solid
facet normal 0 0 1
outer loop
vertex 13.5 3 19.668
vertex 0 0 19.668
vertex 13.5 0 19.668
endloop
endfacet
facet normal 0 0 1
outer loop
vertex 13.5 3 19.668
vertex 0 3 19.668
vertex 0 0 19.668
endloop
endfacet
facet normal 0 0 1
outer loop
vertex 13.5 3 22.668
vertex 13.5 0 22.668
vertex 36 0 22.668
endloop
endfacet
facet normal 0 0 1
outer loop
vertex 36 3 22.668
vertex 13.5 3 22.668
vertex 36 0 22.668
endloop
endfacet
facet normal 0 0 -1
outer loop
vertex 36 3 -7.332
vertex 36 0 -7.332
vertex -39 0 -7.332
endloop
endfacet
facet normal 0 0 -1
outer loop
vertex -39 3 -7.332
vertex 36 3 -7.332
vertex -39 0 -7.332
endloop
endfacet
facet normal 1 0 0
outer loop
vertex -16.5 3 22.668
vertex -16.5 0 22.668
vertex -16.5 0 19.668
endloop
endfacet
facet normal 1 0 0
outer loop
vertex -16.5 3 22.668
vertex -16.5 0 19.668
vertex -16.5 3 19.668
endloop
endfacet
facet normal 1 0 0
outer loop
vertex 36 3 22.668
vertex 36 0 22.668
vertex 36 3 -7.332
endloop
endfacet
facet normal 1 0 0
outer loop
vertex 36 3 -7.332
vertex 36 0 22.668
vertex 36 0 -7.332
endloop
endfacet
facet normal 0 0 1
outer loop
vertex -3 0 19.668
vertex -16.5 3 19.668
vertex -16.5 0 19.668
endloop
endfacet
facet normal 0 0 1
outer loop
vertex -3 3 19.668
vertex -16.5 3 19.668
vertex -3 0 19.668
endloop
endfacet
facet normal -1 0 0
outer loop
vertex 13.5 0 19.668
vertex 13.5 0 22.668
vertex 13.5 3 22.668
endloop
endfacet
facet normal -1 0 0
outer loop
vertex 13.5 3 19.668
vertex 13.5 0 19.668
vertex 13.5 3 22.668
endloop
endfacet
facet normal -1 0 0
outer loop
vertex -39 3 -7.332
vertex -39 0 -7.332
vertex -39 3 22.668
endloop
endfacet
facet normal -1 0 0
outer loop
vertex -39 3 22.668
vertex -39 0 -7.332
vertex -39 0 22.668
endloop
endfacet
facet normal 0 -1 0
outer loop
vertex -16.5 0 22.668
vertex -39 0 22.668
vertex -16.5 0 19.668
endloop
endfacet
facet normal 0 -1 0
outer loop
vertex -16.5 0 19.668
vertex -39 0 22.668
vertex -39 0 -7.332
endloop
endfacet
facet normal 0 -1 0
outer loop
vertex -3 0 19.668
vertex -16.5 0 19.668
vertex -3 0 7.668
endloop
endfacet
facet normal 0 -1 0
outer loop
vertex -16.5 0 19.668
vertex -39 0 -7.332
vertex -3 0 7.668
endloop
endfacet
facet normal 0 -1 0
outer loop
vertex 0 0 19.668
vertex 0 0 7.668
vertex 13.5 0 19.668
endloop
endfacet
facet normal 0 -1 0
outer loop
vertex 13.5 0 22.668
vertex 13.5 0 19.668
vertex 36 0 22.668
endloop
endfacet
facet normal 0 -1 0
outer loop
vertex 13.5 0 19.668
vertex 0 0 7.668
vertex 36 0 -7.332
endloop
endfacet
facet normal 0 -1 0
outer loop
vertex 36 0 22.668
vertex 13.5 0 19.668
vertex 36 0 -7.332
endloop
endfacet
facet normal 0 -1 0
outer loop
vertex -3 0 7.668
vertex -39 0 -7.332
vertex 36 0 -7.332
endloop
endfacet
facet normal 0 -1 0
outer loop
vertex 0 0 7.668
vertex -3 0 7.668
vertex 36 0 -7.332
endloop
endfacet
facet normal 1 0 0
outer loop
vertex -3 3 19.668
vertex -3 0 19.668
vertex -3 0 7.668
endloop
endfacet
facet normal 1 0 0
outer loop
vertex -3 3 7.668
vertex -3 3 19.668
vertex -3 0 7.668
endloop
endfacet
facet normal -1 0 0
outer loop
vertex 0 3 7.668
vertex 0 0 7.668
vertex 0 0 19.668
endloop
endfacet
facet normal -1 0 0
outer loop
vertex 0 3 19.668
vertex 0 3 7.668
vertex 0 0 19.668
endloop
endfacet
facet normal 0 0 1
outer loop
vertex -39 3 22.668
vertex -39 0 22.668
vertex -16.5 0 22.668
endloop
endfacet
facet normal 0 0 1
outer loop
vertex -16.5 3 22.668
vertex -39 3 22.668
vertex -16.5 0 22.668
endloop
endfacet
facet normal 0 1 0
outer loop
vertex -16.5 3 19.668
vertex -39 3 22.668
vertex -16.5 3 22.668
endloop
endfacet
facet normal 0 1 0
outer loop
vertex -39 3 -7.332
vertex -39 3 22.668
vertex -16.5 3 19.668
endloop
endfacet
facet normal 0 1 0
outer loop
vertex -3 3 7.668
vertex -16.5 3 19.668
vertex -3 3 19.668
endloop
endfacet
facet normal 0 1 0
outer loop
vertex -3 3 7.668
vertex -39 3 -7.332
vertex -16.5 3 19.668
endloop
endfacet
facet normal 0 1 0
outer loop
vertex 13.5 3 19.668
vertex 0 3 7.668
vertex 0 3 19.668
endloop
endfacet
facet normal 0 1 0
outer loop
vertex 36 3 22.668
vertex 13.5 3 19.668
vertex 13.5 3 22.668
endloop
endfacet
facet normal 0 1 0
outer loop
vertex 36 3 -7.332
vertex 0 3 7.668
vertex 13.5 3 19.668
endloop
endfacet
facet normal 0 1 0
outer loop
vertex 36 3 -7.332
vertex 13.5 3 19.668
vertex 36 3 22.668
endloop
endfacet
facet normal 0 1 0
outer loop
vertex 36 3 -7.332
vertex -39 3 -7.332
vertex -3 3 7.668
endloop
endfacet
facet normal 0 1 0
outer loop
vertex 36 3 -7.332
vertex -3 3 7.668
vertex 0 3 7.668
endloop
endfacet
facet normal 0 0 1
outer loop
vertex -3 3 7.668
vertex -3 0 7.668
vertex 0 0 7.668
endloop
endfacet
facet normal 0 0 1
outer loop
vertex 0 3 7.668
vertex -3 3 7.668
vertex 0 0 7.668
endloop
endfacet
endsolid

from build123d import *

# Parameters (mm, degrees)
RESSALTO_EXTRUS_O1_DEPTH = 3
ESBO_O2_W                = 30
ESBO_O2_H                = 16.142769795
CORTE_EXTRUS_O2_DEPTH    = 3


with BuildPart() as part:
    # Esboço1 → Ressalto-extrusão1 (new body)
    with BuildSketch(Plane(origin=(0, 0, 0), x_dir=(1, 0, 0), z_dir=(0, 1, 0))):
        Polygon((36, 7.331730769), (-39, 7.331730769), (-39, -22.668269231), (-3, -22.668269231), (-3, -7.668269231), (0, -7.668269231), (0, -22.668269231), (36, -22.668269231), align=None)
    extrude(amount=RESSALTO_EXTRUS_O1_DEPTH)

    # Esboço2 → Corte-extrusão2 (cut)
    with BuildSketch(Plane.XY.offset(22.668269231)):
        with Locations((-1.5, 0.209360247)):
            Rectangle(ESBO_O2_W, ESBO_O2_H)
    extrude(amount=-CORTE_EXTRUS_O2_DEPTH, mode=Mode.SUBTRACT)


solid = part.part
